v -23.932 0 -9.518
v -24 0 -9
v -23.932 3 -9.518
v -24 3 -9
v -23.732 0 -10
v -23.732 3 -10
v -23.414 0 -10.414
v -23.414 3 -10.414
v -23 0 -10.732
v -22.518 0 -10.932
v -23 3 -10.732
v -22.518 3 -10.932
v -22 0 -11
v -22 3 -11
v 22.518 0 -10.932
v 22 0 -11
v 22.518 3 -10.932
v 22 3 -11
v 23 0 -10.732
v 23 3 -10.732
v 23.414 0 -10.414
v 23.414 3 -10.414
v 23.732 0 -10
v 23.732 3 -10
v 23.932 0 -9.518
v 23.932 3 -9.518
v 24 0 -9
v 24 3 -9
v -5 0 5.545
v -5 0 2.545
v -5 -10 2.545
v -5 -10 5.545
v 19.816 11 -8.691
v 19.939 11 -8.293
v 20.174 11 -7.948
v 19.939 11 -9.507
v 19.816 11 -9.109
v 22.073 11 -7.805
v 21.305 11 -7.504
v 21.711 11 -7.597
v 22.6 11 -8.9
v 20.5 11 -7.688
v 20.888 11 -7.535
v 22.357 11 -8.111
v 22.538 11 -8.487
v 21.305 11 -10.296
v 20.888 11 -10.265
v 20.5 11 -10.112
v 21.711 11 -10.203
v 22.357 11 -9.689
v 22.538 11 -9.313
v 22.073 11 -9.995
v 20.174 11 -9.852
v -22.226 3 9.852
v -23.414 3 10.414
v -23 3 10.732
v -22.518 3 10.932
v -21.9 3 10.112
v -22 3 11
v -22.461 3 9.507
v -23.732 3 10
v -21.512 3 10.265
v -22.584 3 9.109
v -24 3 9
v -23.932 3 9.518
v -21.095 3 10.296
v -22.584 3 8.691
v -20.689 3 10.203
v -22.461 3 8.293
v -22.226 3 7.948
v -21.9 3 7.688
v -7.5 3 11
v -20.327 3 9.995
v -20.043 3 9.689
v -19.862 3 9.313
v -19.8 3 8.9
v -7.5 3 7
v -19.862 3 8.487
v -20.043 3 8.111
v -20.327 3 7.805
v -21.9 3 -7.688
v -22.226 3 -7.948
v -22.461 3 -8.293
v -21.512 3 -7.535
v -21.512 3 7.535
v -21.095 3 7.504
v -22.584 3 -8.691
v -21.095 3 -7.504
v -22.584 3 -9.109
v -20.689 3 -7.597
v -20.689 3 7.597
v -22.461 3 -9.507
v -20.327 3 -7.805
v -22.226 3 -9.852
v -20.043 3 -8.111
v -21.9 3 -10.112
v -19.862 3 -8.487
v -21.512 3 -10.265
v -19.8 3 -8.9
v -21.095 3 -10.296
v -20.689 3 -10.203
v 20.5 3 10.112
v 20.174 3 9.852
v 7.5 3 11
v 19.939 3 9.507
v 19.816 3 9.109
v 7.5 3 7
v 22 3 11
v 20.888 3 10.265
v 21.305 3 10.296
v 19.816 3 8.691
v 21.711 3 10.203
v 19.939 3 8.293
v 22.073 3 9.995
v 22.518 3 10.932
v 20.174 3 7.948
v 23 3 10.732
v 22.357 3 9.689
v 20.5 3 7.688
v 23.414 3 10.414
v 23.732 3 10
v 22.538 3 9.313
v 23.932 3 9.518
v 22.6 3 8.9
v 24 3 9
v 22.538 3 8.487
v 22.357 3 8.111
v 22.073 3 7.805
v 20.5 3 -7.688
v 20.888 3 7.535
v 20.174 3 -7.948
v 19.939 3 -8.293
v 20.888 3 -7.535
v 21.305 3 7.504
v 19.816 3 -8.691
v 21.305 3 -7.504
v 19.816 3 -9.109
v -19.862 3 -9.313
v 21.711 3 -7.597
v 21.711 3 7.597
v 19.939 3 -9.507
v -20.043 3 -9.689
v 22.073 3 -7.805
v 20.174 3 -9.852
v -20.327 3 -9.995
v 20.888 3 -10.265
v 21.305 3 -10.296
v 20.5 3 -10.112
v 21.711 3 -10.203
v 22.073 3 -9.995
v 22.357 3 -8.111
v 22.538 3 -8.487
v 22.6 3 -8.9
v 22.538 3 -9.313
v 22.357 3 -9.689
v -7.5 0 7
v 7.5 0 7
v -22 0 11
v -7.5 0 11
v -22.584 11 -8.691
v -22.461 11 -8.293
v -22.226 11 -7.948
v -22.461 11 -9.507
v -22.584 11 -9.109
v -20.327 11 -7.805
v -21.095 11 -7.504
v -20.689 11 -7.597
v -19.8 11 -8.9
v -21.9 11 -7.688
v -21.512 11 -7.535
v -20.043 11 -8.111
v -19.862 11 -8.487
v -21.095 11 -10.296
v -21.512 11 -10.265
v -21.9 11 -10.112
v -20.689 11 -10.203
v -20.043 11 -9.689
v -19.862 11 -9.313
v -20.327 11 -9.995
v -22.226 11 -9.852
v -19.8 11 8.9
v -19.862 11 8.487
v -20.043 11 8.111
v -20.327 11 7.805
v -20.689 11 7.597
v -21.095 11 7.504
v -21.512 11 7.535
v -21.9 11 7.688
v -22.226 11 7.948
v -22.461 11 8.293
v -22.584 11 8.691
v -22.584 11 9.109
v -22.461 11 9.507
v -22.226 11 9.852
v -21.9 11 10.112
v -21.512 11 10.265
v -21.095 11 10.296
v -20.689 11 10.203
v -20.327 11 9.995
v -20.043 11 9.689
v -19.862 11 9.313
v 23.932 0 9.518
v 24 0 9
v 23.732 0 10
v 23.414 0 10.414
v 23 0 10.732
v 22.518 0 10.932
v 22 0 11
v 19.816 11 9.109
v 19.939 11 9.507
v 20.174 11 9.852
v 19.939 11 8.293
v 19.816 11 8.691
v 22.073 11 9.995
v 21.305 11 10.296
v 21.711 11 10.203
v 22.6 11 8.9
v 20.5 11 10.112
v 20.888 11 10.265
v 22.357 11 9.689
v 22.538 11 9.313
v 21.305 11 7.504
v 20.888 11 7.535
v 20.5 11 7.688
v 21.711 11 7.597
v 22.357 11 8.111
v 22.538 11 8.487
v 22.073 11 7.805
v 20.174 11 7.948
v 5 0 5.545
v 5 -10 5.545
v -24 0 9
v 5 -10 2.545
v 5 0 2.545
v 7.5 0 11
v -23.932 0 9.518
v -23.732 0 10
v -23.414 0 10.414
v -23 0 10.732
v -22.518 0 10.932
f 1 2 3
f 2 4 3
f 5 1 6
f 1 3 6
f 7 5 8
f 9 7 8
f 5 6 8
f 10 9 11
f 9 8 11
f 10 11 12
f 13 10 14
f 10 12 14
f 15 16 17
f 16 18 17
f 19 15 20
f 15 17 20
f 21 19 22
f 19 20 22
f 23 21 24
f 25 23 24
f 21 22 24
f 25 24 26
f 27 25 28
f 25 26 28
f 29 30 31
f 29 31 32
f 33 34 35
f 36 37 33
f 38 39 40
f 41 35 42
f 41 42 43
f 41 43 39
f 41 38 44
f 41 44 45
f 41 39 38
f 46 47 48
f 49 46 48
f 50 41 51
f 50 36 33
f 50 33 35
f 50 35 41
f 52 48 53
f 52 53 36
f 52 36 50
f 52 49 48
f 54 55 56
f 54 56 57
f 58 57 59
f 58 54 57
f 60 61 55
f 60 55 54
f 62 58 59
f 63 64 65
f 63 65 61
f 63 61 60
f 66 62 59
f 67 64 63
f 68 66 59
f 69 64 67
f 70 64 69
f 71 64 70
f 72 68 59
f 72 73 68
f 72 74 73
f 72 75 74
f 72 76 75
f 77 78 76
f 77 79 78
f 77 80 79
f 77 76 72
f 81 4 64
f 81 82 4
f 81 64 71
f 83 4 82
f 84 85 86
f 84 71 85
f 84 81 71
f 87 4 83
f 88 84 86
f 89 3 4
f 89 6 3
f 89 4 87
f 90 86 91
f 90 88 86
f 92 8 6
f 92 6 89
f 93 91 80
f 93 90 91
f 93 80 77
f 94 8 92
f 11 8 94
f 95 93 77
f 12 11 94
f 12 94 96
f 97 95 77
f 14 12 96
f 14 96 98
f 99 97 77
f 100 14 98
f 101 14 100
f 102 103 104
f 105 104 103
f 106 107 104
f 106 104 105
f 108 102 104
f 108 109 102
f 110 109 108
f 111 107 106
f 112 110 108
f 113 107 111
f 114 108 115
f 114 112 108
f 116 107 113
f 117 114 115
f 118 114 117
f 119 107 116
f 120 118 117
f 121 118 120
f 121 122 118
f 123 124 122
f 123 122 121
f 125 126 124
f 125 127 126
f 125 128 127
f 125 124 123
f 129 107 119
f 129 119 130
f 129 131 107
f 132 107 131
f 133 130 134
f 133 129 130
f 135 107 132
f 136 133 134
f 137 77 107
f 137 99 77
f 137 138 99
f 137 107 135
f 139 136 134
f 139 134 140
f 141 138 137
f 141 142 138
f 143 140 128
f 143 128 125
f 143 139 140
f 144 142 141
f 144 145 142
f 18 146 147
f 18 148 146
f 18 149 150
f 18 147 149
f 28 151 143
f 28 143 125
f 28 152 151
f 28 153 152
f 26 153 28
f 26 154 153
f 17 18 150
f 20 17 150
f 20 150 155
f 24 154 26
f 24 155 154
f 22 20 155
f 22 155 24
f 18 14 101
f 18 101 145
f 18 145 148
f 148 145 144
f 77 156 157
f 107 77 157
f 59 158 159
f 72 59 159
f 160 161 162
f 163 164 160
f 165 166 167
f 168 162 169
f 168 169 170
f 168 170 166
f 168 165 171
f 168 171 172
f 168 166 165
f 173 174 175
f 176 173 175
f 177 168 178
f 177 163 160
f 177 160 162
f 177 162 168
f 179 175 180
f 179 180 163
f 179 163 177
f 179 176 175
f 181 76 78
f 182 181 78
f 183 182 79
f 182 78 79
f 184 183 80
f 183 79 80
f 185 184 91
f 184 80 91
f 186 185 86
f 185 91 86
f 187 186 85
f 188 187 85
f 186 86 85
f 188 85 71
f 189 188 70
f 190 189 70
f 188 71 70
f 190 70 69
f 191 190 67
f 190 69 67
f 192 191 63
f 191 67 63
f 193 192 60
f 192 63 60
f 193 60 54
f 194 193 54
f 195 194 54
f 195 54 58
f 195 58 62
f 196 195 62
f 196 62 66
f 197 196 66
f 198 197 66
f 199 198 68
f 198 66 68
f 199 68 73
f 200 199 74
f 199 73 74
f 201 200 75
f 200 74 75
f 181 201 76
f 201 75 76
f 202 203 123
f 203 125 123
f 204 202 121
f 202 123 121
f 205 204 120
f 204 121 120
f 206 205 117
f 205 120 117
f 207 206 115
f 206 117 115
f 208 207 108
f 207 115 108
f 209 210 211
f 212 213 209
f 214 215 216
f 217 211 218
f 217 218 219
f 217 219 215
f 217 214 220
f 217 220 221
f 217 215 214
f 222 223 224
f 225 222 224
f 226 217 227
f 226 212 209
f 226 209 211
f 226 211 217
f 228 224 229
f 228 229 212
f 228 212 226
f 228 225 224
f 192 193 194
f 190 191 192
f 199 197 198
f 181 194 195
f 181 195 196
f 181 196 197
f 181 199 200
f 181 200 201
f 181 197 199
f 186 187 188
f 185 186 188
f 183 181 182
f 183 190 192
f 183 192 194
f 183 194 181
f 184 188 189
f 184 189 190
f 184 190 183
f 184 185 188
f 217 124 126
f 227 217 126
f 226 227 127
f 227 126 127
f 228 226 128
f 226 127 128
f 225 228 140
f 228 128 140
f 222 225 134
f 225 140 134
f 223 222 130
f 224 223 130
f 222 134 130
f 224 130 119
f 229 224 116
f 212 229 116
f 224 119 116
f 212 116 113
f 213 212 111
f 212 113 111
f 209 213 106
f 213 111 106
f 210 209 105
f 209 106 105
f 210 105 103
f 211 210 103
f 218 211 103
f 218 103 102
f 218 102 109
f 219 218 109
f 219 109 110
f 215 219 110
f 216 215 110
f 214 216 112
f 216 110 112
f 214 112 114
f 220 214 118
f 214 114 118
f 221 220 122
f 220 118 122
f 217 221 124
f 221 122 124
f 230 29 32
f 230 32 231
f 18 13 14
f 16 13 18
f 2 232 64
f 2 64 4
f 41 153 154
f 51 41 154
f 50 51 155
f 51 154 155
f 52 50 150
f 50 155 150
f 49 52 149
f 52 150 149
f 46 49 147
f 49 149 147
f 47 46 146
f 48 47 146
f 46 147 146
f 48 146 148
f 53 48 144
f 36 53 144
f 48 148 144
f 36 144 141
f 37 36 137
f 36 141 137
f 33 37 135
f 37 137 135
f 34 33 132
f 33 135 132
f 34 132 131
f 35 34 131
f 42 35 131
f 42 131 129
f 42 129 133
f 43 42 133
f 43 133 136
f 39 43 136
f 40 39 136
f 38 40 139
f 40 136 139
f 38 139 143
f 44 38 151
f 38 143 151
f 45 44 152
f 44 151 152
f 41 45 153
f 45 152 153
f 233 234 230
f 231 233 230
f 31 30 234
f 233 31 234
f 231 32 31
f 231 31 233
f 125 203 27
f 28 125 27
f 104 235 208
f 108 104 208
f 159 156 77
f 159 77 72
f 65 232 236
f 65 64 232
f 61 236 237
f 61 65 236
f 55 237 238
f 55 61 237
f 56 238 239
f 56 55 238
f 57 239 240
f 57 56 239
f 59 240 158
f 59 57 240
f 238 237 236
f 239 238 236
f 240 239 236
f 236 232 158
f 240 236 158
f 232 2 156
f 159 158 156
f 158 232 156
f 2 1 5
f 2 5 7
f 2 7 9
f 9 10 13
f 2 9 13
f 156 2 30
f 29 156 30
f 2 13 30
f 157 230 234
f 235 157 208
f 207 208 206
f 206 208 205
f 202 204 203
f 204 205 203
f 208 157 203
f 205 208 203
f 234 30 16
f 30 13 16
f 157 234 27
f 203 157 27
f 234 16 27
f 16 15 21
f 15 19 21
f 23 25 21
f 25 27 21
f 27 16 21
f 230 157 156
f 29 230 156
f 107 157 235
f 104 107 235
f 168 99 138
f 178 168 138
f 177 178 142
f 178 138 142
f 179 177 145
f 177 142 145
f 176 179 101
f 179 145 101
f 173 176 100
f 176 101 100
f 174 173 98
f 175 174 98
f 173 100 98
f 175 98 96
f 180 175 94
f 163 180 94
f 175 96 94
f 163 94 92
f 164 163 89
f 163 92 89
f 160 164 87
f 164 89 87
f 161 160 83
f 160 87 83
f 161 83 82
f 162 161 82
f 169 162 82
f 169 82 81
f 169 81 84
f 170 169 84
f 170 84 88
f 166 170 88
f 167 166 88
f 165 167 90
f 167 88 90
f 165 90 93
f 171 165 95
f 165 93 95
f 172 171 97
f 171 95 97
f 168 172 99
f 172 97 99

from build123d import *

# Parameters (mm, degrees)
SKETCH1_W           = 48
SKETCH1_H           = 22
BOSS_EXTRUDE1_DEPTH = 3
SKETCH2_R           = 1.4
BOSS_EXTRUDE2_DEPTH = 8
SKETCH3_W           = 10
SKETCH3_H           = 3
BOSS_EXTRUDE3_DEPTH = 10
SKETCH4_W           = 15
SKETCH4_H           = 4
CUT_EXTRUDE1_DEPTH  = 10
FILLET1_R           = 2


with BuildPart() as part:
    # Sketch1 → Boss-Extrude1 (new body)
    with BuildSketch(Plane(origin=(0, 0, 0), x_dir=(1, 0, 0), z_dir=(0, 1, 0))):
        Rectangle(SKETCH1_W, SKETCH1_H)
    extrude(amount=BOSS_EXTRUDE1_DEPTH)

    # Sketch2 → Boss-Extrude2 (add)
    with BuildSketch(Plane(origin=(0, 3, 0), x_dir=(1, 0, 0), z_dir=(0, 1, 0))):
        with Locations((-21.2, 8.899999974)):
            Circle(SKETCH2_R)
        with Locations((-21.2, -8.899999974)):
            Circle(SKETCH2_R)
        with Locations((21.2, 8.899999974)):
            Circle(SKETCH2_R)
        with Locations((21.2, -8.899999974)):
            Circle(SKETCH2_R)
    extrude(amount=BOSS_EXTRUDE2_DEPTH)

    # Sketch3 → Boss-Extrude3 (add)
    with BuildSketch(Plane.XZ):
        with Locations((0, 4.044761195)):
            Rectangle(SKETCH3_W, SKETCH3_H)
    extrude(amount=BOSS_EXTRUDE3_DEPTH)

    # Sketch4 → Cut-Extrude1 (cut)
    with BuildSketch(Plane.XZ):
        with Locations((0, 9)):
            Rectangle(SKETCH4_W, SKETCH4_H)
    extrude(amount=-CUT_EXTRUDE1_DEPTH, mode=Mode.SUBTRACT)

    # Fillet1
    fillet1_edges = [part.edges().sort_by_distance(p)[0] for p in [
        (24, 1.5, 11),
        (-24, 1.5, 11),
        (-24, 1.5, -11),
        (24, 1.5, -11),
    ]]
    fillet(fillet1_edges, radius=FILLET1_R)


solid = part.part
